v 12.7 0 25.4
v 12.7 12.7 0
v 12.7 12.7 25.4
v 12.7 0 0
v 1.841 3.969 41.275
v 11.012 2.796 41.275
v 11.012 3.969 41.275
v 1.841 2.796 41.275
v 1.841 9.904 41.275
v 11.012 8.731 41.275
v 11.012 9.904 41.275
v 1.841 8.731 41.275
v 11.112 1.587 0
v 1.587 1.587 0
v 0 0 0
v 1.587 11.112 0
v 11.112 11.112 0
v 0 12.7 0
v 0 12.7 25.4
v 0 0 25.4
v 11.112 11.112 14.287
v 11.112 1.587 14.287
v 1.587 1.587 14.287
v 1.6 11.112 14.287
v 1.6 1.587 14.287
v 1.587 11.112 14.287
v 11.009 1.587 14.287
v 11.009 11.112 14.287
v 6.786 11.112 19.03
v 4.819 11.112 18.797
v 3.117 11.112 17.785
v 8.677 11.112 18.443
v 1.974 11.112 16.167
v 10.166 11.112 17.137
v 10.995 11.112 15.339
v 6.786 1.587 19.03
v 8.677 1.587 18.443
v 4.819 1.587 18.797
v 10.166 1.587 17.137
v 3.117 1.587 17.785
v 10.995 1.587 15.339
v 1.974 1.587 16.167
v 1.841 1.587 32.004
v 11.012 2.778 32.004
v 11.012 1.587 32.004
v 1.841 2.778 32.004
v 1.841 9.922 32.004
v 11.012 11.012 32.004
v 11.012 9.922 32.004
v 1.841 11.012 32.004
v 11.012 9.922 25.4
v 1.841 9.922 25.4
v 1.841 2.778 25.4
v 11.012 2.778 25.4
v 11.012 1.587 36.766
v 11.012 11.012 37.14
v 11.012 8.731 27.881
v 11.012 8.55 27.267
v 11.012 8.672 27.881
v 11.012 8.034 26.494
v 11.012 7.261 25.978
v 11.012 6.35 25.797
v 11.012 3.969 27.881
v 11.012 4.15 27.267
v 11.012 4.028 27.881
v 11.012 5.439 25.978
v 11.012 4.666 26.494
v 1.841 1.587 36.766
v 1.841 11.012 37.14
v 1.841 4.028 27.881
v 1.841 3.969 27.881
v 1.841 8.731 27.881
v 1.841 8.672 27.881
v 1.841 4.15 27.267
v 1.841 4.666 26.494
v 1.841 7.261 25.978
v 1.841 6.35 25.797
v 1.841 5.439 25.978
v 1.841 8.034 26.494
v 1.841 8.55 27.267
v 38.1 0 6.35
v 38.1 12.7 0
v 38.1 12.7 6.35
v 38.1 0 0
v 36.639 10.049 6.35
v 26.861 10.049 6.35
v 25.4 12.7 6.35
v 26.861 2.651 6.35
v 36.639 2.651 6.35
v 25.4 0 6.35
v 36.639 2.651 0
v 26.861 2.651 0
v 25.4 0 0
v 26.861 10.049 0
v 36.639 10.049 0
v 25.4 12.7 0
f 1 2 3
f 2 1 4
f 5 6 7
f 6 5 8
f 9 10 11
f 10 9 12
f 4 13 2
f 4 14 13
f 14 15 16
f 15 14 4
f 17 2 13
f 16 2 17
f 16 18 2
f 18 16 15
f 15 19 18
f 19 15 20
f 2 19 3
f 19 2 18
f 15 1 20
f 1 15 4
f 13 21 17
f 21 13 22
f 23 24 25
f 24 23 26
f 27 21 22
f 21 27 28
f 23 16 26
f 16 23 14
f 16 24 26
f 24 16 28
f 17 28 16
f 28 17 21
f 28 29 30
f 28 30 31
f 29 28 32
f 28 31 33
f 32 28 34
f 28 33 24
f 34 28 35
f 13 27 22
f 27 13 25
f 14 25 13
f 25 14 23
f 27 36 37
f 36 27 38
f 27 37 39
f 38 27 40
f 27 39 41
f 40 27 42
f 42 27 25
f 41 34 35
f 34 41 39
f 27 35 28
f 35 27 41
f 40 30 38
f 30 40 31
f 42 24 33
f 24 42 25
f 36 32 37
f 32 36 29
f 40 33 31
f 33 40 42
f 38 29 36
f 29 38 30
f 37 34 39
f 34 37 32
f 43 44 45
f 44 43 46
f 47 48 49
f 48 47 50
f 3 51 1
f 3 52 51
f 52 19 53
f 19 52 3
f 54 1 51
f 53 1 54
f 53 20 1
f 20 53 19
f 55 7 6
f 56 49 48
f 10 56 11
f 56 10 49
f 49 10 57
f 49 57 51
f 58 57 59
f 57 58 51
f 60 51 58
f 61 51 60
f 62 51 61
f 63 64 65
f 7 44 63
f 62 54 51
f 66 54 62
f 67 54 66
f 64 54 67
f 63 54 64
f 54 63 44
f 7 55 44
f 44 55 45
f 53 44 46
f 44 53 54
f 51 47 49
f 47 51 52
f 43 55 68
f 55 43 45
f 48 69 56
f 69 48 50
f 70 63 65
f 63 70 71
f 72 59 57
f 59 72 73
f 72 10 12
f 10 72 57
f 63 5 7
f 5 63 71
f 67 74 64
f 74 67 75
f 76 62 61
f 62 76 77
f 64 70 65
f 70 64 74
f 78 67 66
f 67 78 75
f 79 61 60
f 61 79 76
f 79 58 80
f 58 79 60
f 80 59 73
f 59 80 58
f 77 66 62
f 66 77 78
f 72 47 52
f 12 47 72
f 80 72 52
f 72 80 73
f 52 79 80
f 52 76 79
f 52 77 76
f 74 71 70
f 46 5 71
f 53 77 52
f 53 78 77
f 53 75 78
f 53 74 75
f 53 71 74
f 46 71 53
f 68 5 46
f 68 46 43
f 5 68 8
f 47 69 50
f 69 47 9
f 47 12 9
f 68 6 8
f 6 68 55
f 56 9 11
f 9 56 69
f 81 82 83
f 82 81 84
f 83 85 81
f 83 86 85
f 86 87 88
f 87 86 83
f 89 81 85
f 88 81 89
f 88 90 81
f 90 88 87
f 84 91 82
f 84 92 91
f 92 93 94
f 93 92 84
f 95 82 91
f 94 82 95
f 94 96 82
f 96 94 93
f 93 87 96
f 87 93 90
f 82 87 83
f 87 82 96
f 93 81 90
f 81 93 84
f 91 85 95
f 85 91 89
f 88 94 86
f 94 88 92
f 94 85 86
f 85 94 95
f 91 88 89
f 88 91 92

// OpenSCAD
units_per_inch=25.4; // Cura takes millimeters

sixteenth_inch = units_per_inch / 16.0;
eighth_inch = units_per_inch / 8.0;
quarter_inch = units_per_inch / 4.0;
half_inch = units_per_inch / 2.0;
inch = units_per_inch / 1.0;

render_slop = .1; // Slop to make up for lack of precision in the renderer (unitless)
print_slop = 0.01*inch; // Slop to make up for oddities/meltiness during printing

leg_wd = half_inch;
leg_thickness = sixteenth_inch;
leg_hole_wd = leg_wd-(2*leg_thickness);

table_height = 1*inch; // 3*inch;
table_thickness = quarter_inch;

total_height = table_height + table_thickness + (3*eighth_inch);

leg_cylinder_support_radius = leg_hole_wd/2;
leg_hole_height = table_height-quarter_inch-leg_cylinder_support_radius;

tab_overhang = 3*(inch/64.0);
table_hole_w = leg_wd-(2*leg_thickness);
table_hole_d = leg_wd-(2*leg_thickness)-(2*tab_overhang);

tab_band_w = leg_wd/2-table_hole_w/2;
tab_band_d = leg_wd/2-table_hole_d/2;
tab_band_h = table_thickness + print_slop;

tab_squeeze_cutout_w = 3*sixteenth_inch;
tab_squeeze_cylinder_support_radius = tab_squeeze_cutout_w/2;
tab_squeeze_total_h = total_height-table_height;
tab_squeeze_inner_h = tab_squeeze_total_h - tab_squeeze_cylinder_support_radius;

tab_squeeze_foot_h = 3*sixteenth_inch;
tab_squeeze_angle_start_h = table_height+tab_band_h+tab_squeeze_foot_h;
tab_squeeze_angle = 75.0; // degrees

difference() { 
  cube([leg_wd,leg_wd,total_height]);

  // punch the hole in the leg
  translate([leg_thickness,leg_thickness,0])
    cube([leg_hole_wd,leg_hole_wd,leg_hole_height]);

  // carve the support cylinder on top so we don't need supports the whole way up
  translate([leg_wd/2, leg_wd/2, leg_hole_height])
    rotate(a=[90,11.25,0]) // 11.25 sets a vertex at the top rather than a side
    cylinder(h=leg_hole_wd, r=leg_cylinder_support_radius, center=true);

  // tab band
  translate([0,0,table_height]) cube([tab_band_w,leg_wd,tab_band_h]);
  translate([leg_wd-tab_band_w-render_slop,0,table_height]) cube([tab_band_w+render_slop,leg_wd,tab_band_h]);

  translate([0,0,table_height]) 
    cube([leg_wd,tab_band_d,tab_band_h]);

  translate([0,leg_wd-tab_band_d,table_height])
    cube([leg_wd,tab_band_d,tab_band_h]);

  translate([0,0,table_height])
    cube([leg_wd,leg_thickness,tab_squeeze_total_h]);

  translate([0,leg_wd-leg_thickness-render_slop,table_height])
    cube([leg_wd,leg_thickness+render_slop,tab_squeeze_total_h]);

  // tab squeeze cutout
  translate([0,(leg_wd/2.0)-(tab_squeeze_cutout_w/2.0),table_height + tab_squeeze_cylinder_support_radius + render_slop]) 
      cube([leg_wd,tab_squeeze_cutout_w,tab_squeeze_inner_h]);
  
  translate([leg_wd/2,leg_wd/2,table_height + tab_squeeze_cylinder_support_radius + sixteenth_inch/4]) 
      rotate(a=[0,90,0])
      cylinder(h=leg_wd, r=tab_squeeze_cylinder_support_radius, center=true, $fn=16);
      
  // ensure tabs nest with hole in stacking leg
  translate([0,0,table_height]) 
      cube([leg_thickness+print_slop,leg_wd,tab_squeeze_total_h]);

  translate([leg_wd-leg_thickness-render_slop,0,table_height])
      cube([leg_thickness+render_slop+print_slop,leg_wd,tab_squeeze_total_h]);

  // angle cutouts for squeeze
  translate([0,leg_thickness,tab_squeeze_angle_start_h]) 
      rotate([tab_squeeze_angle,0,0])
          cube([leg_wd,leg_wd,tab_squeeze_total_h]);

  translate([0,leg_wd-leg_thickness,tab_squeeze_angle_start_h])
      rotate([90-tab_squeeze_angle,0,0])
          cube([leg_wd,leg_wd,tab_squeeze_total_h]);

}

translate([1*inch, 0, 0 * table_height]) difference() {
  cube([leg_wd, leg_wd, table_thickness]);

  translate([leg_thickness - (print_slop/2), (leg_wd/2) - (table_hole_d/2) - (print_slop/2), -sixteenth_inch])
    cube([table_hole_w + print_slop, table_hole_d + print_slop, 17*sixteenth_inch]);
}
